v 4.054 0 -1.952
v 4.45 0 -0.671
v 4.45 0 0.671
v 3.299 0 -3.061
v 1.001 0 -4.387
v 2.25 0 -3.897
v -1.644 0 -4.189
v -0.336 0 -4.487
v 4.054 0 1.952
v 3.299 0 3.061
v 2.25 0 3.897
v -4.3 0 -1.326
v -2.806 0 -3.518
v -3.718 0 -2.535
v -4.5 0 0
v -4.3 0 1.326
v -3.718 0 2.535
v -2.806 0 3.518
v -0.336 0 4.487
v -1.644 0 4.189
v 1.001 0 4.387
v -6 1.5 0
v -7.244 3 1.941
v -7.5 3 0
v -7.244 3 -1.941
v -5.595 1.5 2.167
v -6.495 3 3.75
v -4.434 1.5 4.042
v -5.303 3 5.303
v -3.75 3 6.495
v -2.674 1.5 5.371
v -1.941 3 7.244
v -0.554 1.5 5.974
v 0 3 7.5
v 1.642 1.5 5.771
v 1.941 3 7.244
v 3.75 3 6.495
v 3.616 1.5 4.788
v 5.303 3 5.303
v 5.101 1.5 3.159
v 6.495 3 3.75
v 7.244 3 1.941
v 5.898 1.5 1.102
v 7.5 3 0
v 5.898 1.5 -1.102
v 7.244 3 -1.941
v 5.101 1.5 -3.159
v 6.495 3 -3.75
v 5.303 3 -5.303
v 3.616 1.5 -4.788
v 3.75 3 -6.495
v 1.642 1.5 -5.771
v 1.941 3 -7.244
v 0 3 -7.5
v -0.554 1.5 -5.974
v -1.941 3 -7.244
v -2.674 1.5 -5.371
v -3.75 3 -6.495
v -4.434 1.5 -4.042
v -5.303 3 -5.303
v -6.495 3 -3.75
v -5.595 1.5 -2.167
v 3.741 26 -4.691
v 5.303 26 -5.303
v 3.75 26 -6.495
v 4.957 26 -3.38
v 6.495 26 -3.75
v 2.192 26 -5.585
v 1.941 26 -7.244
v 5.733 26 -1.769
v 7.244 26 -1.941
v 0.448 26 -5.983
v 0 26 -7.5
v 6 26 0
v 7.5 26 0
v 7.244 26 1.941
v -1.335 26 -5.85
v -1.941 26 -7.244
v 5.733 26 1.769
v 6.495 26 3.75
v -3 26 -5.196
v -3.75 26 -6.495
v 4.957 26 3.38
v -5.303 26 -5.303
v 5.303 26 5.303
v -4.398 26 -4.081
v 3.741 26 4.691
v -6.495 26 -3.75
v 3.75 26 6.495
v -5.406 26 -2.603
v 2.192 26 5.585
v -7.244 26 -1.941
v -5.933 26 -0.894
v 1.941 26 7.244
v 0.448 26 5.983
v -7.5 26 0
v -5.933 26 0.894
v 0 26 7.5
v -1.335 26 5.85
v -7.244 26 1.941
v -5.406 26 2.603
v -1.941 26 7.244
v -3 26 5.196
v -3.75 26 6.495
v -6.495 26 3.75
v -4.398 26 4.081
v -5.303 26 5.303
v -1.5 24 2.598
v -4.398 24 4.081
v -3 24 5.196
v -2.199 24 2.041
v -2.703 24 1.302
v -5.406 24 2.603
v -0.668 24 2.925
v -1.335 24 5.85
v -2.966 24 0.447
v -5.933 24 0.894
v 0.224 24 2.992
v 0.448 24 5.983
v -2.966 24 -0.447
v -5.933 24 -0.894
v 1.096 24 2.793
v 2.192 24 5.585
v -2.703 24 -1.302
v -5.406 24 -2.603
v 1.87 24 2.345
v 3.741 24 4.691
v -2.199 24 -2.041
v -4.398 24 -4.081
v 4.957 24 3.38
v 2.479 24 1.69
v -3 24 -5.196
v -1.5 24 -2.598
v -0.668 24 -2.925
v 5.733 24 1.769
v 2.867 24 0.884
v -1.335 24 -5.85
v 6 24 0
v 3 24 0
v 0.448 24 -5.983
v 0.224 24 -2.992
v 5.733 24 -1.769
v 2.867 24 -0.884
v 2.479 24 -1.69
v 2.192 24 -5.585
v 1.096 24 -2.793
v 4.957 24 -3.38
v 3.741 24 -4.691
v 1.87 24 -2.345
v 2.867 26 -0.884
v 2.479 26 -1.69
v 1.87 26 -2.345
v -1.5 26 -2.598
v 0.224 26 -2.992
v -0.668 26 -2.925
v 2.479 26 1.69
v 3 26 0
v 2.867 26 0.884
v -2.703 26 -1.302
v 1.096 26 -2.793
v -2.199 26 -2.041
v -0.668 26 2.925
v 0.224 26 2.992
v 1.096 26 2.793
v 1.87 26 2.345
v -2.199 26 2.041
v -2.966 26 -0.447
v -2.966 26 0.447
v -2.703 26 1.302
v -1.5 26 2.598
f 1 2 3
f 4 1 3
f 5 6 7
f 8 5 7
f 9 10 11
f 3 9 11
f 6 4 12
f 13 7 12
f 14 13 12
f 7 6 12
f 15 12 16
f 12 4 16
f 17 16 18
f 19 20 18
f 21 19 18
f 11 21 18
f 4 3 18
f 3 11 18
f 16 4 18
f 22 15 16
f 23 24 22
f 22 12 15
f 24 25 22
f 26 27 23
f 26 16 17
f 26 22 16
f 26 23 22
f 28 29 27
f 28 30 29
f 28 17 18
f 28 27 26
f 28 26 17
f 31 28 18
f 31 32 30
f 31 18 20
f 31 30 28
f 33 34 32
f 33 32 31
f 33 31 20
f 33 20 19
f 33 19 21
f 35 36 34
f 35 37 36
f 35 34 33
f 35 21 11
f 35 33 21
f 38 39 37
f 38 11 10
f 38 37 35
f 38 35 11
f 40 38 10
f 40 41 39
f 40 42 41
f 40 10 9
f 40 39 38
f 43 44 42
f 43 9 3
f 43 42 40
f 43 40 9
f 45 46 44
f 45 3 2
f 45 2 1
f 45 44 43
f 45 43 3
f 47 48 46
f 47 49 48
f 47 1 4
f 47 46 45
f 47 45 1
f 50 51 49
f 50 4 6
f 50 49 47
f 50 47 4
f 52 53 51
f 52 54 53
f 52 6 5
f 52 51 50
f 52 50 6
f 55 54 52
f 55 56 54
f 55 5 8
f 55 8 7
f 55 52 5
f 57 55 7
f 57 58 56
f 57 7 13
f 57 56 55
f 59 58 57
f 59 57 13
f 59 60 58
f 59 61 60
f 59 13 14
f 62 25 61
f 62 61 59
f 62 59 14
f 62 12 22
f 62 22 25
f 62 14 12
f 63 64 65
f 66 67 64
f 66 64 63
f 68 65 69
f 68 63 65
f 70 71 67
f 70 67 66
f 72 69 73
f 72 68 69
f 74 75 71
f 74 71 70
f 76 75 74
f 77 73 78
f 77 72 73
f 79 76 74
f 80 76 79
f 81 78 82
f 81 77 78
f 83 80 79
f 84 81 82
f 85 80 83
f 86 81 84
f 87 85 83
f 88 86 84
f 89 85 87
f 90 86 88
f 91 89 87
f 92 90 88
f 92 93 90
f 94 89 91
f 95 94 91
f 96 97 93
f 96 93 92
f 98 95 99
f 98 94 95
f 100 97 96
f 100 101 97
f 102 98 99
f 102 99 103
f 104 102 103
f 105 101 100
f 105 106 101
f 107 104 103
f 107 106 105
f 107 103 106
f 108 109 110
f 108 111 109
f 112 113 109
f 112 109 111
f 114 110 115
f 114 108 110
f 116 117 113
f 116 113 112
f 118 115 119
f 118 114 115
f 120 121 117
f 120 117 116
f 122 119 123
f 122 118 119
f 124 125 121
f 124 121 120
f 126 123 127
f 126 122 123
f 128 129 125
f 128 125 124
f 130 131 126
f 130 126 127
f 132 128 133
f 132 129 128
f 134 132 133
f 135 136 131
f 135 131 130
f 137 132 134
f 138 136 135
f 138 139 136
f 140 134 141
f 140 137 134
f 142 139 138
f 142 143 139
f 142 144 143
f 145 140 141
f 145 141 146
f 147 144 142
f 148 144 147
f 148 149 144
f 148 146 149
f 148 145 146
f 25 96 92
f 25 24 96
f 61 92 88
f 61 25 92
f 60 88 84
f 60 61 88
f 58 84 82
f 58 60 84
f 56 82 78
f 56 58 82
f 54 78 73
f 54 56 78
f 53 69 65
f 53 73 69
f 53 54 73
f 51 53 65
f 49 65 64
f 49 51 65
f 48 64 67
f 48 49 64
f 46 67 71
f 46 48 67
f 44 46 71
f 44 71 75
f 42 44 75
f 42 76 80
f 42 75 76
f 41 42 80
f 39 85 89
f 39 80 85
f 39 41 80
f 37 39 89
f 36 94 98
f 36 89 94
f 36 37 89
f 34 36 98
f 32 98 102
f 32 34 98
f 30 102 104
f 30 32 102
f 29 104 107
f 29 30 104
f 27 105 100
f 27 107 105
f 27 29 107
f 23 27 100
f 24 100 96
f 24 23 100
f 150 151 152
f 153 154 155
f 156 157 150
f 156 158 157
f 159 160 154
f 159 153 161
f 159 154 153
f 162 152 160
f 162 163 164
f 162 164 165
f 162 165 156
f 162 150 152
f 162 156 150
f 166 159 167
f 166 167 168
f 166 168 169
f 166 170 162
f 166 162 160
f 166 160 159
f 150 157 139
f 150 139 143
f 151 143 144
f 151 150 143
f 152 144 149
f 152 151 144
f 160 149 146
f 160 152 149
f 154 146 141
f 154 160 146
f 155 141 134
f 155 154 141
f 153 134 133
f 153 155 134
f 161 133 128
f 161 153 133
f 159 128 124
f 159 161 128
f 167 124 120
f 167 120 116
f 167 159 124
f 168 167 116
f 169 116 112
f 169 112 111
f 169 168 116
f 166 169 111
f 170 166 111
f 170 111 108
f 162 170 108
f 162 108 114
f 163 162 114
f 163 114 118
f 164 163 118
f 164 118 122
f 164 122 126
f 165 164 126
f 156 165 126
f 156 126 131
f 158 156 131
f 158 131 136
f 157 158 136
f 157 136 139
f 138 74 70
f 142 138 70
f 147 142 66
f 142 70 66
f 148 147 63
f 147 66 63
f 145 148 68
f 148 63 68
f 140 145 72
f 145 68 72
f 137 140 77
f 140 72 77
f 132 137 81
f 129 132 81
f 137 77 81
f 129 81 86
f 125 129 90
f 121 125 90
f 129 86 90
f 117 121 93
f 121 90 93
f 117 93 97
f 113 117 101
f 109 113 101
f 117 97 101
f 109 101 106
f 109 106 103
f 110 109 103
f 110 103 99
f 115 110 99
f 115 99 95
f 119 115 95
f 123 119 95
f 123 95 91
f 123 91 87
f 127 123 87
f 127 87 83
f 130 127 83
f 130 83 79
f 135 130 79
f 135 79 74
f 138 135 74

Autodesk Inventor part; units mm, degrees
ref_plane "YZ Plane" through (0, 0, 0) normal (1, 0, 0) x (0, 1, 0)
ref_plane "XZ Plane" through (0, 0, 0) normal (0, 1, 0) x (-1, 0, 0)
ref_plane "XY Plane" through (0, 0, 0) normal (0, 0, 1) x (1, 0, 0)
sketch "Esquisse1" plane through (0, 0, 0) normal (0, 1, 0) x (-1, 0, 0)
  circle A0 centre (0, 0) radius 7.5
  dimension "d0" = 15
extrude "Extrusion1" add sketch "Esquisse1" along normal blind 26
sketch "Esquisse2" plane through (0, 26, 0) normal (0, 1, 0) x (1, 0, 0)
  circle A0 centre (0, 0) radius 6
  circle A1 centre (0, 0) radius 3
  dimension "d3" = 12
  dimension "d4" = 6
extrude "Extrusion2" cut sketch "Esquisse2" against normal blind 2
chamfer "Chanfrein1" distance 3 angle 45 1 edges at (7.5, 0, 0)
properties part number "Pion rond"
